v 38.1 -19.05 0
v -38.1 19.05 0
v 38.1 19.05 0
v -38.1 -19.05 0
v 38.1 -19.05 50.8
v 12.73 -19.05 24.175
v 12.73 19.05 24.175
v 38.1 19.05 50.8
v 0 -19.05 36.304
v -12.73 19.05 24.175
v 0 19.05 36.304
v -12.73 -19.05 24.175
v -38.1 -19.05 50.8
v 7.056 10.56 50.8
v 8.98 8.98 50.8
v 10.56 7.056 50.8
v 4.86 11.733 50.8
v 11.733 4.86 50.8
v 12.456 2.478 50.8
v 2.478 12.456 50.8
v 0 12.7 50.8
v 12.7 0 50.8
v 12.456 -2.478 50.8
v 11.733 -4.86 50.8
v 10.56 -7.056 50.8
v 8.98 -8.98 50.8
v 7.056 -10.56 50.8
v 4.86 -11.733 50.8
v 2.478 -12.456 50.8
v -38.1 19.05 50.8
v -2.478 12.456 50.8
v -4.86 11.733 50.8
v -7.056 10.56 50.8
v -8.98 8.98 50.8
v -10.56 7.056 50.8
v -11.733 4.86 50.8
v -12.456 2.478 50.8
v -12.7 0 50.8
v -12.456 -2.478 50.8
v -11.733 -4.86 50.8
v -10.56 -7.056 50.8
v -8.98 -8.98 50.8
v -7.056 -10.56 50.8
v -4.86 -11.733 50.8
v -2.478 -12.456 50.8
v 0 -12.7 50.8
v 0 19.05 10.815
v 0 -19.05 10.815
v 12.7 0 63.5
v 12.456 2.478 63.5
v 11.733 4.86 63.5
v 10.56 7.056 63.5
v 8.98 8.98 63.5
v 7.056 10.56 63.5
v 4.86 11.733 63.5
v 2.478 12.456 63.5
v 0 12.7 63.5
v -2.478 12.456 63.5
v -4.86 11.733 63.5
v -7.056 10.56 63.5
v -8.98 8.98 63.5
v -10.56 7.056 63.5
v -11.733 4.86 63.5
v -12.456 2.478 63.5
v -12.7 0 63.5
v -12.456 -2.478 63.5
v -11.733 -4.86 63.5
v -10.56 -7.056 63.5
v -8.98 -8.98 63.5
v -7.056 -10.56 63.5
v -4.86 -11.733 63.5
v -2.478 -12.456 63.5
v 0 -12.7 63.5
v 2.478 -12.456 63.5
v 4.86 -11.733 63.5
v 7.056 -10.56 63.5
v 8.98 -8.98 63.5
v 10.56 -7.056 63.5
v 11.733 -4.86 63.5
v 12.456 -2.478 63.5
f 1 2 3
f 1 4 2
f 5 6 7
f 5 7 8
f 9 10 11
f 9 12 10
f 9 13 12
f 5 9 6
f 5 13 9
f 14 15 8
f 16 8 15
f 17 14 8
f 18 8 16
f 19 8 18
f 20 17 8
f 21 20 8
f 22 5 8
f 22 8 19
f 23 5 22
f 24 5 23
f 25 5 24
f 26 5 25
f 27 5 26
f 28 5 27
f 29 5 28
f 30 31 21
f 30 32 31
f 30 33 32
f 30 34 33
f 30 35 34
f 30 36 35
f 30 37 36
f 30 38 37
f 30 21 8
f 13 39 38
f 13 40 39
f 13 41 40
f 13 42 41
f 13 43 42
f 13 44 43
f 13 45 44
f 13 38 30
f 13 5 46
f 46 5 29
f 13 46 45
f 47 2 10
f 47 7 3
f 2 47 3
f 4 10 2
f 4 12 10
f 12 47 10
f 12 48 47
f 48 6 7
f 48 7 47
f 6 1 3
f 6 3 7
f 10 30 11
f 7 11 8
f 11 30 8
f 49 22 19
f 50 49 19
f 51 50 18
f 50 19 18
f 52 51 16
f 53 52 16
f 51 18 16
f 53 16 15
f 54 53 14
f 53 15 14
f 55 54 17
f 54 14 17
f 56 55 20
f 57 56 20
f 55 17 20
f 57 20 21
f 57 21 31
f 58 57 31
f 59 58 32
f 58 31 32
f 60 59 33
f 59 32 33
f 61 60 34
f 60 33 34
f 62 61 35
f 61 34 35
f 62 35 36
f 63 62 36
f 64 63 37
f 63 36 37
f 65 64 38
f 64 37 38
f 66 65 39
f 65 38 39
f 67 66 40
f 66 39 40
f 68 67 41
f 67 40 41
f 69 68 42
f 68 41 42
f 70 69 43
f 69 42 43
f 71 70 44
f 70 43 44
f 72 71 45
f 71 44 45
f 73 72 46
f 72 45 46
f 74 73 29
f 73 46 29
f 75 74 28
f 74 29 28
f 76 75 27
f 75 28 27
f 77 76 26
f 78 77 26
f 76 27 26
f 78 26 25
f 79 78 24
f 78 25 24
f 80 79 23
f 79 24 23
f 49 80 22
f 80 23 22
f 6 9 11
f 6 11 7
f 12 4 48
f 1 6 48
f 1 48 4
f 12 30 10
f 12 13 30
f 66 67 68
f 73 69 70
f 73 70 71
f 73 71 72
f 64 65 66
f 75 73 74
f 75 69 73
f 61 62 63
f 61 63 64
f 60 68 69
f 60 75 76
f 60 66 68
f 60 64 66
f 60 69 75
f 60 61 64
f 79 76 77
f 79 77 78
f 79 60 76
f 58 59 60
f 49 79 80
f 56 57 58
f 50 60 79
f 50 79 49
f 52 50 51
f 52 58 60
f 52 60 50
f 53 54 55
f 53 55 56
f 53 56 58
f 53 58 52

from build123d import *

# Parameters (mm, degrees)
F0_R     = 12.7
F1_DEPTH = 12.7
F4_DEPTH = 19.05


with BuildPart() as f1:
    # F0 (on Top) → F1 (new body)
    with BuildSketch(Plane.XY):
        Circle(F0_R)
    extrude(amount=F1_DEPTH)


with BuildPart() as f1_1:
    # F2: moved
    add(f1.part.moved(Location((0, 0, 50.8))))

    # F3 (on Front) → F4 (join, symmetric)
    with BuildSketch(Plane.XZ):
        Polygon((-38.1, 50.8), (-12.729577, 24.174578), (0, 36.304141), (12.729577, 24.174578), (38.1, 50.8), (0, 50.8), align=None)
        Polygon((-38.1, 0), (0, 0), (38.1, 0), (12.729577, 24.174578), (0, 10.815306), (-12.729577, 24.174578), align=None)
    extrude(amount=F4_DEPTH, both=True)


solid = f1_1.part
